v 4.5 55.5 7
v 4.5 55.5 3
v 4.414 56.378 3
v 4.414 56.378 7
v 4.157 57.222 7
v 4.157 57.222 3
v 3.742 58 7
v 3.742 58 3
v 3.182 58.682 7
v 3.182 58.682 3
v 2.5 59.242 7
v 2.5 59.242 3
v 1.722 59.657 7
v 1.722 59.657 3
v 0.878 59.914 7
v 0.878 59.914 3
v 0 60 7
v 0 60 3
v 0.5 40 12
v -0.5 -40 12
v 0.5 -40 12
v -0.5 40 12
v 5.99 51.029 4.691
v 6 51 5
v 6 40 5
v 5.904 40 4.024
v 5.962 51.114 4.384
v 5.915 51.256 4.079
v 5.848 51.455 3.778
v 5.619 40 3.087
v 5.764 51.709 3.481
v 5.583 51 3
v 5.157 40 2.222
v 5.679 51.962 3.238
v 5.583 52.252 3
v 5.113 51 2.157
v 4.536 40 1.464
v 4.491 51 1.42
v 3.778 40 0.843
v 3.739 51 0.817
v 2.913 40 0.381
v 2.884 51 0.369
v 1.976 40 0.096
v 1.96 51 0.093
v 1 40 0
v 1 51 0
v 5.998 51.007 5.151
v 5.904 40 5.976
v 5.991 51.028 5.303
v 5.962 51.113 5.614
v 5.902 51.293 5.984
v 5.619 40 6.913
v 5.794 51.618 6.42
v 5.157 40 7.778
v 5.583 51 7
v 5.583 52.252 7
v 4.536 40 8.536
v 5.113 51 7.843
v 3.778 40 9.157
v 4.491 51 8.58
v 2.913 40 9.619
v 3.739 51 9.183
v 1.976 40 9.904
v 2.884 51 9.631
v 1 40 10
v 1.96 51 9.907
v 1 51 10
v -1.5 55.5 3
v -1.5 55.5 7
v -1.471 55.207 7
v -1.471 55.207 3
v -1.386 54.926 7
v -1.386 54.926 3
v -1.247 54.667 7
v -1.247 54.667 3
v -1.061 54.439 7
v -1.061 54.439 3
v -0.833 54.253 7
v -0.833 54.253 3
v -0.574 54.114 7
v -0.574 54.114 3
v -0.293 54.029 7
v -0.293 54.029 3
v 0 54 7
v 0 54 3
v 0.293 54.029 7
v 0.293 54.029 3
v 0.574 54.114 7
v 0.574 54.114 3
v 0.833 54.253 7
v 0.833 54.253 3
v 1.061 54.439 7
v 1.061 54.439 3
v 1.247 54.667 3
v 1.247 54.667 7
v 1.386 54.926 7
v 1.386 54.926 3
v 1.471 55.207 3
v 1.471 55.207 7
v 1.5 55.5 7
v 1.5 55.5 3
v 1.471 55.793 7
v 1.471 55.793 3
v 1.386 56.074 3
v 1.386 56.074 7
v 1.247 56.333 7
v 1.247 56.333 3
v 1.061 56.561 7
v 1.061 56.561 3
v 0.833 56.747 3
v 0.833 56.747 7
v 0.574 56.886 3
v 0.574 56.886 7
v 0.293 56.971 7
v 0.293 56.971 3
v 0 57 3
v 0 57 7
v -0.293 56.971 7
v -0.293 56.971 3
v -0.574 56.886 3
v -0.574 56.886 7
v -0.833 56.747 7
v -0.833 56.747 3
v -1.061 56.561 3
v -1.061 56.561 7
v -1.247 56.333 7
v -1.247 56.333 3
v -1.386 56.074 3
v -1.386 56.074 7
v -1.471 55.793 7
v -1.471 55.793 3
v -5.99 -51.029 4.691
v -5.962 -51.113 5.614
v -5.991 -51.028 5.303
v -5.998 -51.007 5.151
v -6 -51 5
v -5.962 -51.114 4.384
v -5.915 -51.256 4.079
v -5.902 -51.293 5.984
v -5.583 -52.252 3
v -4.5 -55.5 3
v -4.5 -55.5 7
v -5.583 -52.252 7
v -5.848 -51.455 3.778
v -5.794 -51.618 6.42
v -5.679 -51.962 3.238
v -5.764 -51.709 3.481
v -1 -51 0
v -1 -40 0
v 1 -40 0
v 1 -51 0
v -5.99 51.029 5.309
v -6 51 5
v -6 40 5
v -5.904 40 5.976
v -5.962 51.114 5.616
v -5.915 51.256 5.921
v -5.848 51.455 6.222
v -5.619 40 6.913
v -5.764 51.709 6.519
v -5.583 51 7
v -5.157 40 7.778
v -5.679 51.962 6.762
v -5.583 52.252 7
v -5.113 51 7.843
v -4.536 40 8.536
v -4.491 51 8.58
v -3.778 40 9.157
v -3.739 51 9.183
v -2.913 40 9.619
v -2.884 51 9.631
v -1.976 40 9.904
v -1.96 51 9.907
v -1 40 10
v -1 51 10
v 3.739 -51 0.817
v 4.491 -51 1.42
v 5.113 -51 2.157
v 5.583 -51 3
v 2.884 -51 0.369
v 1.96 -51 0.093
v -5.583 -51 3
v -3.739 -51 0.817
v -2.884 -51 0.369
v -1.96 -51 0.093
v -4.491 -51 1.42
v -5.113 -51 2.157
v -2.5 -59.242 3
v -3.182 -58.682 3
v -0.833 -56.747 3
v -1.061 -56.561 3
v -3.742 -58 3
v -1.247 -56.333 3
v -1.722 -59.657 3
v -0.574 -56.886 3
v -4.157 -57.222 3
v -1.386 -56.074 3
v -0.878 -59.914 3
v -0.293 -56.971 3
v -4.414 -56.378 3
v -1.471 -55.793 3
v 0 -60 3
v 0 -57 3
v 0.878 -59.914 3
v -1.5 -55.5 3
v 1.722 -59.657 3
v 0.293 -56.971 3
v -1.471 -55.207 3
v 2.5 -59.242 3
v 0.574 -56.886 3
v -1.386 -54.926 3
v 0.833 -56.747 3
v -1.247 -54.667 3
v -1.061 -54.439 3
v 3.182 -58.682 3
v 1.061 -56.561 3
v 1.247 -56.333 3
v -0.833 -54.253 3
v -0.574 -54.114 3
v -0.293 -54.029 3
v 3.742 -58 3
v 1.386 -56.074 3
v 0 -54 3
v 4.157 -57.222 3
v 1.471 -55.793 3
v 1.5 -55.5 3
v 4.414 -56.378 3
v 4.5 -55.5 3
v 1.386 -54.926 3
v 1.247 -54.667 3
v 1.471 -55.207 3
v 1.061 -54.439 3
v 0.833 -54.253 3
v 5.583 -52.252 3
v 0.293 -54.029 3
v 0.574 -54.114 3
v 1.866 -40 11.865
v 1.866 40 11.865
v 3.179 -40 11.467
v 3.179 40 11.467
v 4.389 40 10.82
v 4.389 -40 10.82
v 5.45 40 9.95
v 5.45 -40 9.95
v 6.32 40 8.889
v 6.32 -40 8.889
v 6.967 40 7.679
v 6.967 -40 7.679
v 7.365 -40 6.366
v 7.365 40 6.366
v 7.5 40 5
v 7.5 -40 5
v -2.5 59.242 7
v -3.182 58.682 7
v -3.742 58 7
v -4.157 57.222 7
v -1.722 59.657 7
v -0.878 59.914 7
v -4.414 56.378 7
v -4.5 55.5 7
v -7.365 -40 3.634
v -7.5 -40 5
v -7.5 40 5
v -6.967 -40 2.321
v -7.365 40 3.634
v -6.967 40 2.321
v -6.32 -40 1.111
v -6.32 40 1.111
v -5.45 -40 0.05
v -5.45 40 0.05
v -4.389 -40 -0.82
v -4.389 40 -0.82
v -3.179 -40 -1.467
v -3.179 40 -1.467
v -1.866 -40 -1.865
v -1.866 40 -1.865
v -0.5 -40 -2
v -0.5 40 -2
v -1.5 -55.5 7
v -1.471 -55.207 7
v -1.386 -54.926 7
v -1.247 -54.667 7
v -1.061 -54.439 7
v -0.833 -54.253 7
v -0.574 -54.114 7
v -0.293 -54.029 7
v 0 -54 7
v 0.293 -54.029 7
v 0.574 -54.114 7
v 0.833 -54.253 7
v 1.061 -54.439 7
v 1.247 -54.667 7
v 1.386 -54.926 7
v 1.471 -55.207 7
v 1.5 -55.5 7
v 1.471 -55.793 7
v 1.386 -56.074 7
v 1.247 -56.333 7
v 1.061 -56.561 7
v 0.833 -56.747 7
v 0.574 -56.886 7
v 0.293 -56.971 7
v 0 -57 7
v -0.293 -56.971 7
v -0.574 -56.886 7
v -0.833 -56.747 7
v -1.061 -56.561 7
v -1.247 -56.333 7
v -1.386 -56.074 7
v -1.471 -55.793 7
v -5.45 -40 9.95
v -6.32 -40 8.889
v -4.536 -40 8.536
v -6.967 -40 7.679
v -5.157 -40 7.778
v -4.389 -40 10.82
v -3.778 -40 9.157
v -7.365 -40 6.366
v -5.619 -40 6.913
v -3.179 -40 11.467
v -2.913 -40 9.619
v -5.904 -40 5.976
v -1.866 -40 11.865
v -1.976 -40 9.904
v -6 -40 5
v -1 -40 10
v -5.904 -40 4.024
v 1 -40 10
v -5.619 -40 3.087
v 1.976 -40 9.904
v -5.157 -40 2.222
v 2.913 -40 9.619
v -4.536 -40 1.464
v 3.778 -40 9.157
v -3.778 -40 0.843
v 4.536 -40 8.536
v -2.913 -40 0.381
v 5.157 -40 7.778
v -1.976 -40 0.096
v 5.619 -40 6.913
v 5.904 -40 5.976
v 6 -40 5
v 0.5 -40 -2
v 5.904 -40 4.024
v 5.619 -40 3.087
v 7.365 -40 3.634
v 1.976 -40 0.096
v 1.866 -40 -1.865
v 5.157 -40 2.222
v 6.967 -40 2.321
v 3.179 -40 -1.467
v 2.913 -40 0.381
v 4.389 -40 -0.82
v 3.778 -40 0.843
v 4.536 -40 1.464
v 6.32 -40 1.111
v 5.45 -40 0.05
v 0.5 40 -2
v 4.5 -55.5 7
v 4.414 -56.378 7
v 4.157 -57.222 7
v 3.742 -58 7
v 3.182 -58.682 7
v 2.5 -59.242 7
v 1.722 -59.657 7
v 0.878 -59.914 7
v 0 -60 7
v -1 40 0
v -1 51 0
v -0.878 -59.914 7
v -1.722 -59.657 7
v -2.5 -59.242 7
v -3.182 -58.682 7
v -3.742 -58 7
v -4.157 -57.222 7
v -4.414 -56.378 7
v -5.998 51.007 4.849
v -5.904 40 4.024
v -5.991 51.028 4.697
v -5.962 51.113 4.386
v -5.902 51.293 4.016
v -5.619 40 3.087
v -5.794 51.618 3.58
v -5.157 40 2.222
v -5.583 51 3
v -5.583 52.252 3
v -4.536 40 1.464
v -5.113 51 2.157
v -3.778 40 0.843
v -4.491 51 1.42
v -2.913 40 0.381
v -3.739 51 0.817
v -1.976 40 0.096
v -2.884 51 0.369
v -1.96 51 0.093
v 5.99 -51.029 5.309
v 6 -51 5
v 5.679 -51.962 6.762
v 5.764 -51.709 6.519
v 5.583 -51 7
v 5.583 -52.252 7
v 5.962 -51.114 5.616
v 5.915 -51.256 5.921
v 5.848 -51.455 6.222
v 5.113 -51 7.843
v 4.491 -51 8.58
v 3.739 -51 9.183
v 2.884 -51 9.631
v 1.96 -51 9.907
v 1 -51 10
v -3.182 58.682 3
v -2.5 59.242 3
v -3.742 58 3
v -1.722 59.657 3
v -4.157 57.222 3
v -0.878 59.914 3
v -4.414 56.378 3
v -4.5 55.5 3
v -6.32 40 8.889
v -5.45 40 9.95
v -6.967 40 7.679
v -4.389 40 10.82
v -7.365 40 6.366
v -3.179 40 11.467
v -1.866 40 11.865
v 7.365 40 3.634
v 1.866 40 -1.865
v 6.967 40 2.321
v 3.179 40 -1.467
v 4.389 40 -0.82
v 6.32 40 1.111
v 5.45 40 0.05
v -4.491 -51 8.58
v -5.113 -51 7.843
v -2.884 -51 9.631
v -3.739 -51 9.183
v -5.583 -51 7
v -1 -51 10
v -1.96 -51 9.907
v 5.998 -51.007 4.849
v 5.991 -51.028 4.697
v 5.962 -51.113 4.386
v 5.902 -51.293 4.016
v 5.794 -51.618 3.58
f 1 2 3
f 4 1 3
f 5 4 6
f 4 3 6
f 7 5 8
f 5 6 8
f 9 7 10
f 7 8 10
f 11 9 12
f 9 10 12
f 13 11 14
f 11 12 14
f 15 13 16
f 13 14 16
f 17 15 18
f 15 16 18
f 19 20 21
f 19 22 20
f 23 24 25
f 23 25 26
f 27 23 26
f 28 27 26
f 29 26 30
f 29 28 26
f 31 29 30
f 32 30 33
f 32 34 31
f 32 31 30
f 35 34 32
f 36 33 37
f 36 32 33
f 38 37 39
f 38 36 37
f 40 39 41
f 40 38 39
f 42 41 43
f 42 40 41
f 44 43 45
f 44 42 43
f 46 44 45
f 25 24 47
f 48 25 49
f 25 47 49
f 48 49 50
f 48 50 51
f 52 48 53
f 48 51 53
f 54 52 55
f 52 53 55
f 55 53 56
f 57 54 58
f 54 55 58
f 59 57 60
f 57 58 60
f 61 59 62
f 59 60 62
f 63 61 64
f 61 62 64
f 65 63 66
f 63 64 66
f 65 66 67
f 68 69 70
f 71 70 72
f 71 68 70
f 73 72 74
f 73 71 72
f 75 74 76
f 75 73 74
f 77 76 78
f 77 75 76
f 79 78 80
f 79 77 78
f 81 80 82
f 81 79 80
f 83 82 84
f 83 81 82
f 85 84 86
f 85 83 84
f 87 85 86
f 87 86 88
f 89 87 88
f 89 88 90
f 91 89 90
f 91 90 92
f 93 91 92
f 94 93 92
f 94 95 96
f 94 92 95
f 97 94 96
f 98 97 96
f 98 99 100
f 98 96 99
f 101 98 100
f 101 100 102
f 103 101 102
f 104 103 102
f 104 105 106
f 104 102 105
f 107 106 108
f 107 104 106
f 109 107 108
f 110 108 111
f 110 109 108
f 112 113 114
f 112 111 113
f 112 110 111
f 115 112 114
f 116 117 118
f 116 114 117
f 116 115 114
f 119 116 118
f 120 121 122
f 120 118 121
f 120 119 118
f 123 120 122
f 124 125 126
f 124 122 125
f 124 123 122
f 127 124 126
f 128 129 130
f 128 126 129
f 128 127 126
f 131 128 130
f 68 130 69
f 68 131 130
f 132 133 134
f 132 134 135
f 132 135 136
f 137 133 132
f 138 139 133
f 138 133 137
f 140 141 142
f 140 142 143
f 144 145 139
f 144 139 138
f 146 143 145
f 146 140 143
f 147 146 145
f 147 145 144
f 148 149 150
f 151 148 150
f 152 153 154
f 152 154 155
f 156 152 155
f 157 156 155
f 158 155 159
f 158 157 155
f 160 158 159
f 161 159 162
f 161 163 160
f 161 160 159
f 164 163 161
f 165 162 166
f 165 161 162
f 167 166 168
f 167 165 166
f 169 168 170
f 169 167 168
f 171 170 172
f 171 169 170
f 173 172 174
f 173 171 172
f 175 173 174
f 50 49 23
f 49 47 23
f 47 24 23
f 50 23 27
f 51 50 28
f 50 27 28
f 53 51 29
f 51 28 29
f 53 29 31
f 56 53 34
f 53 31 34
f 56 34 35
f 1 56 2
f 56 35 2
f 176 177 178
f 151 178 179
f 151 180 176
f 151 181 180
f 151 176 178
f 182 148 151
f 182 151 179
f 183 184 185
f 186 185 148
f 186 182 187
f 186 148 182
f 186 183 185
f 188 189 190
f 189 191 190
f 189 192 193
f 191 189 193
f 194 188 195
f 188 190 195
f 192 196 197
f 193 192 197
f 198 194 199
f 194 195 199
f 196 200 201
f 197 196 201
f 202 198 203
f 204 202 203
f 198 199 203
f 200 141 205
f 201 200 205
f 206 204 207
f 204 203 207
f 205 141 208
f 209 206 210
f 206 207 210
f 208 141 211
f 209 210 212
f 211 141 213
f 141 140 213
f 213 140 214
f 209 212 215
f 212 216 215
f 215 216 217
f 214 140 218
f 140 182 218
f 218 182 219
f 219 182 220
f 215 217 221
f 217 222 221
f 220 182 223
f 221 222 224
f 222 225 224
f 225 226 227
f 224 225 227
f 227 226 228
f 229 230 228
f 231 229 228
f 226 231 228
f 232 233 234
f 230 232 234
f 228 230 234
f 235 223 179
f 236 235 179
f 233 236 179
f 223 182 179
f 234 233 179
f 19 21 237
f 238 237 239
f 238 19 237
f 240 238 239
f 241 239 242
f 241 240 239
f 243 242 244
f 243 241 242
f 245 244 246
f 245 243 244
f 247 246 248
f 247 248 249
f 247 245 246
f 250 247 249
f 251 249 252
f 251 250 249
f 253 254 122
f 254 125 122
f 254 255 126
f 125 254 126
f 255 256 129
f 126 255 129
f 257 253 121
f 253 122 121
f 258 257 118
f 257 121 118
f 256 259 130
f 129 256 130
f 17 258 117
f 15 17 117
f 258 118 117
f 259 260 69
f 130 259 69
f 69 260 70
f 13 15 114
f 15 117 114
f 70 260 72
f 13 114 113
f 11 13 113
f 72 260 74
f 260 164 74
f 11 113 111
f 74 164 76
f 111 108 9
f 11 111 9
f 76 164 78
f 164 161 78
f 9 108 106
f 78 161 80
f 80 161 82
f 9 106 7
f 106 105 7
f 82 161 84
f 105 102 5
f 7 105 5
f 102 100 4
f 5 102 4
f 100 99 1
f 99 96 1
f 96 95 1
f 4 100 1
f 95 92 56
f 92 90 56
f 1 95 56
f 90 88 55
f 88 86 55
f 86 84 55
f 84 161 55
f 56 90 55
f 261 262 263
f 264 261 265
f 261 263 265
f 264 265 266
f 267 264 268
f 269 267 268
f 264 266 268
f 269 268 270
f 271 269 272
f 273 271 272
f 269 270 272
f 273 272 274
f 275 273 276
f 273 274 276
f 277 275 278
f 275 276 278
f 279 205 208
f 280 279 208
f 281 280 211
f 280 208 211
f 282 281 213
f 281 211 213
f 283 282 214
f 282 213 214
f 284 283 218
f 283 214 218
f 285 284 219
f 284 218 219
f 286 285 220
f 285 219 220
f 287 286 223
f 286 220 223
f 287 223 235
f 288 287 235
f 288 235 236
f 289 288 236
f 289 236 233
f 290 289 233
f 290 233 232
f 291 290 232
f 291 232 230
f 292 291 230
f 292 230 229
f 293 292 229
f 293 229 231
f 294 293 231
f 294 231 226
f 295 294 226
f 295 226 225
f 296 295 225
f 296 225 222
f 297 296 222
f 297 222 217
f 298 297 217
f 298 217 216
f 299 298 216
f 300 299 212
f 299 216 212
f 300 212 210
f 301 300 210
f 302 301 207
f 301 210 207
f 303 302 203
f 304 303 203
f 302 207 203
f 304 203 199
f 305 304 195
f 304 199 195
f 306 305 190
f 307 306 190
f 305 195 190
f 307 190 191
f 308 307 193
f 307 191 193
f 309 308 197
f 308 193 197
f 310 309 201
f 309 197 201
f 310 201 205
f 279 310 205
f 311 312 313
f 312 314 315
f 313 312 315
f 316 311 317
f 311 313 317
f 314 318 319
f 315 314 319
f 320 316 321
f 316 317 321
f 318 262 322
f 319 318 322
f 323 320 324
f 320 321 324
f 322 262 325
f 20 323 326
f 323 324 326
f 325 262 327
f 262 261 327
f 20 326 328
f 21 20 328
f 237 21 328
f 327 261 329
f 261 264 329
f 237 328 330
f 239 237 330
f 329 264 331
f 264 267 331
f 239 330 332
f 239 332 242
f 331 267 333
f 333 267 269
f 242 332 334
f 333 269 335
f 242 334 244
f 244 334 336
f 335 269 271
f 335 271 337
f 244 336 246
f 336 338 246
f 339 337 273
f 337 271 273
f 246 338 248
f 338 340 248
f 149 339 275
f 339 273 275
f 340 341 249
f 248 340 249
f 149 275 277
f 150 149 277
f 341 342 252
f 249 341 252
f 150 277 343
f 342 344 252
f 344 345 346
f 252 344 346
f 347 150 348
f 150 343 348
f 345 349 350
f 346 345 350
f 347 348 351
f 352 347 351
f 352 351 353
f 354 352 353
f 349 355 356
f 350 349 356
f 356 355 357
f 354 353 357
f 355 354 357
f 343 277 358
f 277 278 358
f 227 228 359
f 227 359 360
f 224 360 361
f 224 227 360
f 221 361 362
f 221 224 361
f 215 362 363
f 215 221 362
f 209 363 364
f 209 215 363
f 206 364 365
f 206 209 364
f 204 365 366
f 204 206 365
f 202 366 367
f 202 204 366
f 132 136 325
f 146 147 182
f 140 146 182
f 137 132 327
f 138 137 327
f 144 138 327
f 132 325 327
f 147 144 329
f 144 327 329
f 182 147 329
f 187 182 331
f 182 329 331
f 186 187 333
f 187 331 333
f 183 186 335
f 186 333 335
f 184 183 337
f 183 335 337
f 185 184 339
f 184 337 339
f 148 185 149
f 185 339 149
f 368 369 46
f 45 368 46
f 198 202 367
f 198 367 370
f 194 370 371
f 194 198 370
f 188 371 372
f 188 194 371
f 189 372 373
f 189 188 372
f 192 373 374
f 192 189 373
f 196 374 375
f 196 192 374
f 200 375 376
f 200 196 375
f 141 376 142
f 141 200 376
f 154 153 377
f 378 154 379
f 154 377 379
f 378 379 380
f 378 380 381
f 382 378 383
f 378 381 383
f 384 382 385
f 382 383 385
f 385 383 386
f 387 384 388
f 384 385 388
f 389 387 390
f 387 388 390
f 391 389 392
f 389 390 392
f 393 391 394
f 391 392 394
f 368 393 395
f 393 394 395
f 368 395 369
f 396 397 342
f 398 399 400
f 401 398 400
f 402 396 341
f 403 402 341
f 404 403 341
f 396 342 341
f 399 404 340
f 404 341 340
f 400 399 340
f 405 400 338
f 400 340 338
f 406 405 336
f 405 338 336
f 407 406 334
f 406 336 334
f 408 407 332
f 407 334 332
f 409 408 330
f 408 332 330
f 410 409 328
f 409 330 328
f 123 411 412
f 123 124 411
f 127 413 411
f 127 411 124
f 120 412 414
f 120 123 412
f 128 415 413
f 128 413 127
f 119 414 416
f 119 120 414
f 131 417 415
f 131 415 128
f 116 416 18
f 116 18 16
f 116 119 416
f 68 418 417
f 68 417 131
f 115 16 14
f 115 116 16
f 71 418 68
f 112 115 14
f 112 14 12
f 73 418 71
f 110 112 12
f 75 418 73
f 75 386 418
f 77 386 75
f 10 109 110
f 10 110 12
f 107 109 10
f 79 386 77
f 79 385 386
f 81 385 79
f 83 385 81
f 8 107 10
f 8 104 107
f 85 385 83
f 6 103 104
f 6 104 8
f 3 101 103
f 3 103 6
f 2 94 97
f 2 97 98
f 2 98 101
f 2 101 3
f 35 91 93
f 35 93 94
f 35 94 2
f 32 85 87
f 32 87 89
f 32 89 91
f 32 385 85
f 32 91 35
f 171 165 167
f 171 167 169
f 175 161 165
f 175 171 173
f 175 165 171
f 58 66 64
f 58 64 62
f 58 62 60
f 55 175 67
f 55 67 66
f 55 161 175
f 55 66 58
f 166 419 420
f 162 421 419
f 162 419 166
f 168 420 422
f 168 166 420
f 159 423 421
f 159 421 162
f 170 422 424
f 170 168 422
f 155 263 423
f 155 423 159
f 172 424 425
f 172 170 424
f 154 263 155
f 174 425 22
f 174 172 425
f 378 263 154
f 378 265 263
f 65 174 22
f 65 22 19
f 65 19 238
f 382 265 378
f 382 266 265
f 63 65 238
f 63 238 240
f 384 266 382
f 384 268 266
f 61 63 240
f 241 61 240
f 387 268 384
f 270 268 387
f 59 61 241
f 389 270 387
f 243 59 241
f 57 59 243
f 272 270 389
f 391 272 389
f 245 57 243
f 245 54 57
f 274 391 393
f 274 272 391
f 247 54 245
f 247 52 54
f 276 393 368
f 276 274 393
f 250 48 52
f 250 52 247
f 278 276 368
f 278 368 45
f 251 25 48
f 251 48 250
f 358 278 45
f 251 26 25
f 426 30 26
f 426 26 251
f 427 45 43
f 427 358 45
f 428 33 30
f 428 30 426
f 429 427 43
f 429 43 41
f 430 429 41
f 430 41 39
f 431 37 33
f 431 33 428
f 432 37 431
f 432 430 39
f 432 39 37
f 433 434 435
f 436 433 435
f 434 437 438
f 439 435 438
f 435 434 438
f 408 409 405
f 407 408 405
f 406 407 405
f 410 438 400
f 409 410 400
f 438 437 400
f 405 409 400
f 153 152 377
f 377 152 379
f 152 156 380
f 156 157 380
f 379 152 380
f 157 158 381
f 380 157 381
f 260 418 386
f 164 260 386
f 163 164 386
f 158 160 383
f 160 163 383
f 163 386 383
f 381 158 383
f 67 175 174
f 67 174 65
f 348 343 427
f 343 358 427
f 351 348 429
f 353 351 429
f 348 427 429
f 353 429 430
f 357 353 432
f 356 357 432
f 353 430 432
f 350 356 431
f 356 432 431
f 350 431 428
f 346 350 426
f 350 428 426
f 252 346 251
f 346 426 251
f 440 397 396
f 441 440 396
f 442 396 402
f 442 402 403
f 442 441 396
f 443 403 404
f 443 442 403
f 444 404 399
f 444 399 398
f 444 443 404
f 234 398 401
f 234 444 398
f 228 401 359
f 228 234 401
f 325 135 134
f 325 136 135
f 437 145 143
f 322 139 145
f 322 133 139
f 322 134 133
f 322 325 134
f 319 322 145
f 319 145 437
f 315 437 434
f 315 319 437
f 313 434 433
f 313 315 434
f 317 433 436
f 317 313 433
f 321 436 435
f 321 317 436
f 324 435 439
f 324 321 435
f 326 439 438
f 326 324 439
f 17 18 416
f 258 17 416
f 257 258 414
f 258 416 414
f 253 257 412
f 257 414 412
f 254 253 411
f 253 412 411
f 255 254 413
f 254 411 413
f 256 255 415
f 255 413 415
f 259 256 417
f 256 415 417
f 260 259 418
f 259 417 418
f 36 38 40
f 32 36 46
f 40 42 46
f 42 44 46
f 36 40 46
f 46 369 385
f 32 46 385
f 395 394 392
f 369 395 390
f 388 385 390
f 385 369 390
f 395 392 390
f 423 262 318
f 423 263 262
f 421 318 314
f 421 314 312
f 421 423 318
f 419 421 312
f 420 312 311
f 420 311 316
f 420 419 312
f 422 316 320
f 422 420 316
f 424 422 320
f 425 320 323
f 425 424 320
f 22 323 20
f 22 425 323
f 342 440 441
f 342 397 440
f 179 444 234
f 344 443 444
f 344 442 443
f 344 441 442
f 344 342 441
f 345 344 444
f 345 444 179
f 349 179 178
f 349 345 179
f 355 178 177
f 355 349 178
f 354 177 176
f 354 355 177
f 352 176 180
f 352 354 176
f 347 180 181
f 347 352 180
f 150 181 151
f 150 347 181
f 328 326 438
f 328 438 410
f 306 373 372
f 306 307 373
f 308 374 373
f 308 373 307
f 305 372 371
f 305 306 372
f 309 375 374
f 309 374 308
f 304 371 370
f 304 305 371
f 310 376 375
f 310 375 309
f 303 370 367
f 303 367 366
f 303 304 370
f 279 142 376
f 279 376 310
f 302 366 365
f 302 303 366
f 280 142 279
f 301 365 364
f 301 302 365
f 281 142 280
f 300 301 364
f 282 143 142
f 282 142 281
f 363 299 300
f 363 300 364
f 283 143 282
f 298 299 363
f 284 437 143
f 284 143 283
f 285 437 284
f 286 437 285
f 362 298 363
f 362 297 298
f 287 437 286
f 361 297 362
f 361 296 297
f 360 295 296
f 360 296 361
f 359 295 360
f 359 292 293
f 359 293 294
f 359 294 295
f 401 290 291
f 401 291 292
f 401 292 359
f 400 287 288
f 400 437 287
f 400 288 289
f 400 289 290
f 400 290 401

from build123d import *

# Parameters (mm, degrees)
SKETCH2_W                = 12
SKETCH2_H                = 120
BOSS_EXTRUDE1_DEPTH      = 10
FILLET1_R                = 5
CUT_EXTRUDE1_DEPTH       = 3
CUT_EXTRUDE2_START       = 7
SKETCH3_2_W              = 12
SKETCH3_2_H              = 9
CUT_EXTRUDE2_DEPTH       = 3
CUT_EXTRUDE4_START       = -4
CUT_EXTRUDE4_DEPTH       = 66.12282716
SKETCH7_R                = 1.5
CUT_EXTRUDE5_DEPTH       = 61.704200843
BOSS_EXTRUDE2_DEPTH      = 7
BOSS_EXTRUDE2_DEPTH_BACK = 7
SKETCH9_W                = 15
SKETCH9_H                = 80
FILLET3_R                = 7


with BuildPart() as part:
    # Sketch2 → Boss-Extrude1 (new body)
    with BuildSketch(Plane.XY):
        Rectangle(SKETCH2_W, SKETCH2_H)
    extrude(amount=BOSS_EXTRUDE1_DEPTH)

    # Fillet1
    fillet1_edges = [part.edges().sort_by_distance(p)[0] for p in [
        (-6, 0, 0),
        (6, 0, 0),
        (6, 0, 10),
        (-6, 0, 10),
    ]]
    fillet(fillet1_edges, radius=FILLET1_R - 0.0001)  # a hair under: the kernel refuses the full size

    # Sketch3 → Cut-Extrude1 (cut)
    with BuildSketch(Plane.XY):
        with BuildLine():
            Line((-6, -51), (-4.5, -55.5))
            ThreePointArc((-4.5, -55.5), (0, -60), (4.5, -55.5))
            Line((4.5, -55.5), (6, -51))
            Line((6, -51), (-6, -51))
        make_face()
        with BuildLine():
            Line((0, -60), (6, -60))
            Line((6, -60), (6, -51))
            Line((6, -51), (4.5, -55.5))
            ThreePointArc((4.5, -55.5), (3.181980515, -58.681980515), (0, -60))
        make_face()
        with BuildLine():
            Line((-6, -60), (0, -60))
            ThreePointArc((0, -60), (-3.181980515, -58.681980515), (-4.5, -55.5))
            Line((-4.5, -55.5), (-6, -51))
            Line((-6, -51), (-6, -60))
        make_face()
    cut_extrude1 = extrude(amount=CUT_EXTRUDE1_DEPTH, mode=Mode.SUBTRACT)

    # Sketch3<2> → Cut-Extrude2 (cut)
    with BuildSketch(Plane.XY.offset(CUT_EXTRUDE2_START)):
        with Locations((0, -55.5)):
            Rectangle(SKETCH3_2_W, SKETCH3_2_H)
    cut_extrude2 = extrude(amount=CUT_EXTRUDE2_DEPTH, mode=Mode.SUBTRACT)

    # Mirror1: Cut-Extrude1, Cut-Extrude2 across plane
    add(cut_extrude1.mirror(Plane.ZX), mode=Mode.SUBTRACT)
    add(cut_extrude2.mirror(Plane.ZX), mode=Mode.SUBTRACT)

    # Sketch3<4> → Cut-Extrude4 (cut)
    with BuildSketch(Plane.XY.offset(CUT_EXTRUDE4_START)):
        with BuildLine():
            Line((0, -60), (6, -60))
            Line((6, -60), (6, -51))
            Line((6, -51), (4.5, -55.5))
            ThreePointArc((4.5, -55.5), (3.181980515, -58.681980515), (0, -60))
        make_face()
        with BuildLine():
            Line((-6, -60), (0, -60))
            ThreePointArc((0, -60), (-3.181980515, -58.681980515), (-4.5, -55.5))
            Line((-4.5, -55.5), (-6, -51))
            Line((-6, -51), (-6, -60))
        make_face()
    cut_extrude4 = extrude(amount=CUT_EXTRUDE4_DEPTH, mode=Mode.SUBTRACT)

    # Sketch7 → Cut-Extrude5 (cut, through all)
    with BuildSketch(Plane(origin=(0, 0, 3), x_dir=(-1, 0, 0), z_dir=(0, 0, -1))):
        with Locations((0, -55.5)):
            Circle(SKETCH7_R)
    cut_extrude5 = extrude(amount=-CUT_EXTRUDE5_DEPTH, mode=Mode.SUBTRACT)

    # Mirror3: Cut-Extrude5 across plane
    add(cut_extrude5.mirror(Plane.ZX), mode=Mode.SUBTRACT)

    # Mirror4: Cut-Extrude4 across plane
    add(cut_extrude4.mirror(Plane.ZX), mode=Mode.SUBTRACT)

    # Sketch9 → Boss-Extrude2 (add, two sides: drawn at the far end of the back side and taken through both)
    with BuildSketch(Plane.XY.offset(5).offset(-BOSS_EXTRUDE2_DEPTH_BACK)):
        Rectangle(SKETCH9_W, SKETCH9_H)
    extrude(amount=BOSS_EXTRUDE2_DEPTH + BOSS_EXTRUDE2_DEPTH_BACK)

    # Fillet3
    fillet3_edges = [part.edges().sort_by_distance(p)[0] for p in [
        (-7.5, 0, 12),
        (7.5, 0, 12),
        (7.5, 0, -2),
        (-7.5, 0, -2),
    ]]
    fillet(fillet3_edges, radius=FILLET3_R - 0.0001)  # a hair under: the kernel refuses the full size


solid = part.part
